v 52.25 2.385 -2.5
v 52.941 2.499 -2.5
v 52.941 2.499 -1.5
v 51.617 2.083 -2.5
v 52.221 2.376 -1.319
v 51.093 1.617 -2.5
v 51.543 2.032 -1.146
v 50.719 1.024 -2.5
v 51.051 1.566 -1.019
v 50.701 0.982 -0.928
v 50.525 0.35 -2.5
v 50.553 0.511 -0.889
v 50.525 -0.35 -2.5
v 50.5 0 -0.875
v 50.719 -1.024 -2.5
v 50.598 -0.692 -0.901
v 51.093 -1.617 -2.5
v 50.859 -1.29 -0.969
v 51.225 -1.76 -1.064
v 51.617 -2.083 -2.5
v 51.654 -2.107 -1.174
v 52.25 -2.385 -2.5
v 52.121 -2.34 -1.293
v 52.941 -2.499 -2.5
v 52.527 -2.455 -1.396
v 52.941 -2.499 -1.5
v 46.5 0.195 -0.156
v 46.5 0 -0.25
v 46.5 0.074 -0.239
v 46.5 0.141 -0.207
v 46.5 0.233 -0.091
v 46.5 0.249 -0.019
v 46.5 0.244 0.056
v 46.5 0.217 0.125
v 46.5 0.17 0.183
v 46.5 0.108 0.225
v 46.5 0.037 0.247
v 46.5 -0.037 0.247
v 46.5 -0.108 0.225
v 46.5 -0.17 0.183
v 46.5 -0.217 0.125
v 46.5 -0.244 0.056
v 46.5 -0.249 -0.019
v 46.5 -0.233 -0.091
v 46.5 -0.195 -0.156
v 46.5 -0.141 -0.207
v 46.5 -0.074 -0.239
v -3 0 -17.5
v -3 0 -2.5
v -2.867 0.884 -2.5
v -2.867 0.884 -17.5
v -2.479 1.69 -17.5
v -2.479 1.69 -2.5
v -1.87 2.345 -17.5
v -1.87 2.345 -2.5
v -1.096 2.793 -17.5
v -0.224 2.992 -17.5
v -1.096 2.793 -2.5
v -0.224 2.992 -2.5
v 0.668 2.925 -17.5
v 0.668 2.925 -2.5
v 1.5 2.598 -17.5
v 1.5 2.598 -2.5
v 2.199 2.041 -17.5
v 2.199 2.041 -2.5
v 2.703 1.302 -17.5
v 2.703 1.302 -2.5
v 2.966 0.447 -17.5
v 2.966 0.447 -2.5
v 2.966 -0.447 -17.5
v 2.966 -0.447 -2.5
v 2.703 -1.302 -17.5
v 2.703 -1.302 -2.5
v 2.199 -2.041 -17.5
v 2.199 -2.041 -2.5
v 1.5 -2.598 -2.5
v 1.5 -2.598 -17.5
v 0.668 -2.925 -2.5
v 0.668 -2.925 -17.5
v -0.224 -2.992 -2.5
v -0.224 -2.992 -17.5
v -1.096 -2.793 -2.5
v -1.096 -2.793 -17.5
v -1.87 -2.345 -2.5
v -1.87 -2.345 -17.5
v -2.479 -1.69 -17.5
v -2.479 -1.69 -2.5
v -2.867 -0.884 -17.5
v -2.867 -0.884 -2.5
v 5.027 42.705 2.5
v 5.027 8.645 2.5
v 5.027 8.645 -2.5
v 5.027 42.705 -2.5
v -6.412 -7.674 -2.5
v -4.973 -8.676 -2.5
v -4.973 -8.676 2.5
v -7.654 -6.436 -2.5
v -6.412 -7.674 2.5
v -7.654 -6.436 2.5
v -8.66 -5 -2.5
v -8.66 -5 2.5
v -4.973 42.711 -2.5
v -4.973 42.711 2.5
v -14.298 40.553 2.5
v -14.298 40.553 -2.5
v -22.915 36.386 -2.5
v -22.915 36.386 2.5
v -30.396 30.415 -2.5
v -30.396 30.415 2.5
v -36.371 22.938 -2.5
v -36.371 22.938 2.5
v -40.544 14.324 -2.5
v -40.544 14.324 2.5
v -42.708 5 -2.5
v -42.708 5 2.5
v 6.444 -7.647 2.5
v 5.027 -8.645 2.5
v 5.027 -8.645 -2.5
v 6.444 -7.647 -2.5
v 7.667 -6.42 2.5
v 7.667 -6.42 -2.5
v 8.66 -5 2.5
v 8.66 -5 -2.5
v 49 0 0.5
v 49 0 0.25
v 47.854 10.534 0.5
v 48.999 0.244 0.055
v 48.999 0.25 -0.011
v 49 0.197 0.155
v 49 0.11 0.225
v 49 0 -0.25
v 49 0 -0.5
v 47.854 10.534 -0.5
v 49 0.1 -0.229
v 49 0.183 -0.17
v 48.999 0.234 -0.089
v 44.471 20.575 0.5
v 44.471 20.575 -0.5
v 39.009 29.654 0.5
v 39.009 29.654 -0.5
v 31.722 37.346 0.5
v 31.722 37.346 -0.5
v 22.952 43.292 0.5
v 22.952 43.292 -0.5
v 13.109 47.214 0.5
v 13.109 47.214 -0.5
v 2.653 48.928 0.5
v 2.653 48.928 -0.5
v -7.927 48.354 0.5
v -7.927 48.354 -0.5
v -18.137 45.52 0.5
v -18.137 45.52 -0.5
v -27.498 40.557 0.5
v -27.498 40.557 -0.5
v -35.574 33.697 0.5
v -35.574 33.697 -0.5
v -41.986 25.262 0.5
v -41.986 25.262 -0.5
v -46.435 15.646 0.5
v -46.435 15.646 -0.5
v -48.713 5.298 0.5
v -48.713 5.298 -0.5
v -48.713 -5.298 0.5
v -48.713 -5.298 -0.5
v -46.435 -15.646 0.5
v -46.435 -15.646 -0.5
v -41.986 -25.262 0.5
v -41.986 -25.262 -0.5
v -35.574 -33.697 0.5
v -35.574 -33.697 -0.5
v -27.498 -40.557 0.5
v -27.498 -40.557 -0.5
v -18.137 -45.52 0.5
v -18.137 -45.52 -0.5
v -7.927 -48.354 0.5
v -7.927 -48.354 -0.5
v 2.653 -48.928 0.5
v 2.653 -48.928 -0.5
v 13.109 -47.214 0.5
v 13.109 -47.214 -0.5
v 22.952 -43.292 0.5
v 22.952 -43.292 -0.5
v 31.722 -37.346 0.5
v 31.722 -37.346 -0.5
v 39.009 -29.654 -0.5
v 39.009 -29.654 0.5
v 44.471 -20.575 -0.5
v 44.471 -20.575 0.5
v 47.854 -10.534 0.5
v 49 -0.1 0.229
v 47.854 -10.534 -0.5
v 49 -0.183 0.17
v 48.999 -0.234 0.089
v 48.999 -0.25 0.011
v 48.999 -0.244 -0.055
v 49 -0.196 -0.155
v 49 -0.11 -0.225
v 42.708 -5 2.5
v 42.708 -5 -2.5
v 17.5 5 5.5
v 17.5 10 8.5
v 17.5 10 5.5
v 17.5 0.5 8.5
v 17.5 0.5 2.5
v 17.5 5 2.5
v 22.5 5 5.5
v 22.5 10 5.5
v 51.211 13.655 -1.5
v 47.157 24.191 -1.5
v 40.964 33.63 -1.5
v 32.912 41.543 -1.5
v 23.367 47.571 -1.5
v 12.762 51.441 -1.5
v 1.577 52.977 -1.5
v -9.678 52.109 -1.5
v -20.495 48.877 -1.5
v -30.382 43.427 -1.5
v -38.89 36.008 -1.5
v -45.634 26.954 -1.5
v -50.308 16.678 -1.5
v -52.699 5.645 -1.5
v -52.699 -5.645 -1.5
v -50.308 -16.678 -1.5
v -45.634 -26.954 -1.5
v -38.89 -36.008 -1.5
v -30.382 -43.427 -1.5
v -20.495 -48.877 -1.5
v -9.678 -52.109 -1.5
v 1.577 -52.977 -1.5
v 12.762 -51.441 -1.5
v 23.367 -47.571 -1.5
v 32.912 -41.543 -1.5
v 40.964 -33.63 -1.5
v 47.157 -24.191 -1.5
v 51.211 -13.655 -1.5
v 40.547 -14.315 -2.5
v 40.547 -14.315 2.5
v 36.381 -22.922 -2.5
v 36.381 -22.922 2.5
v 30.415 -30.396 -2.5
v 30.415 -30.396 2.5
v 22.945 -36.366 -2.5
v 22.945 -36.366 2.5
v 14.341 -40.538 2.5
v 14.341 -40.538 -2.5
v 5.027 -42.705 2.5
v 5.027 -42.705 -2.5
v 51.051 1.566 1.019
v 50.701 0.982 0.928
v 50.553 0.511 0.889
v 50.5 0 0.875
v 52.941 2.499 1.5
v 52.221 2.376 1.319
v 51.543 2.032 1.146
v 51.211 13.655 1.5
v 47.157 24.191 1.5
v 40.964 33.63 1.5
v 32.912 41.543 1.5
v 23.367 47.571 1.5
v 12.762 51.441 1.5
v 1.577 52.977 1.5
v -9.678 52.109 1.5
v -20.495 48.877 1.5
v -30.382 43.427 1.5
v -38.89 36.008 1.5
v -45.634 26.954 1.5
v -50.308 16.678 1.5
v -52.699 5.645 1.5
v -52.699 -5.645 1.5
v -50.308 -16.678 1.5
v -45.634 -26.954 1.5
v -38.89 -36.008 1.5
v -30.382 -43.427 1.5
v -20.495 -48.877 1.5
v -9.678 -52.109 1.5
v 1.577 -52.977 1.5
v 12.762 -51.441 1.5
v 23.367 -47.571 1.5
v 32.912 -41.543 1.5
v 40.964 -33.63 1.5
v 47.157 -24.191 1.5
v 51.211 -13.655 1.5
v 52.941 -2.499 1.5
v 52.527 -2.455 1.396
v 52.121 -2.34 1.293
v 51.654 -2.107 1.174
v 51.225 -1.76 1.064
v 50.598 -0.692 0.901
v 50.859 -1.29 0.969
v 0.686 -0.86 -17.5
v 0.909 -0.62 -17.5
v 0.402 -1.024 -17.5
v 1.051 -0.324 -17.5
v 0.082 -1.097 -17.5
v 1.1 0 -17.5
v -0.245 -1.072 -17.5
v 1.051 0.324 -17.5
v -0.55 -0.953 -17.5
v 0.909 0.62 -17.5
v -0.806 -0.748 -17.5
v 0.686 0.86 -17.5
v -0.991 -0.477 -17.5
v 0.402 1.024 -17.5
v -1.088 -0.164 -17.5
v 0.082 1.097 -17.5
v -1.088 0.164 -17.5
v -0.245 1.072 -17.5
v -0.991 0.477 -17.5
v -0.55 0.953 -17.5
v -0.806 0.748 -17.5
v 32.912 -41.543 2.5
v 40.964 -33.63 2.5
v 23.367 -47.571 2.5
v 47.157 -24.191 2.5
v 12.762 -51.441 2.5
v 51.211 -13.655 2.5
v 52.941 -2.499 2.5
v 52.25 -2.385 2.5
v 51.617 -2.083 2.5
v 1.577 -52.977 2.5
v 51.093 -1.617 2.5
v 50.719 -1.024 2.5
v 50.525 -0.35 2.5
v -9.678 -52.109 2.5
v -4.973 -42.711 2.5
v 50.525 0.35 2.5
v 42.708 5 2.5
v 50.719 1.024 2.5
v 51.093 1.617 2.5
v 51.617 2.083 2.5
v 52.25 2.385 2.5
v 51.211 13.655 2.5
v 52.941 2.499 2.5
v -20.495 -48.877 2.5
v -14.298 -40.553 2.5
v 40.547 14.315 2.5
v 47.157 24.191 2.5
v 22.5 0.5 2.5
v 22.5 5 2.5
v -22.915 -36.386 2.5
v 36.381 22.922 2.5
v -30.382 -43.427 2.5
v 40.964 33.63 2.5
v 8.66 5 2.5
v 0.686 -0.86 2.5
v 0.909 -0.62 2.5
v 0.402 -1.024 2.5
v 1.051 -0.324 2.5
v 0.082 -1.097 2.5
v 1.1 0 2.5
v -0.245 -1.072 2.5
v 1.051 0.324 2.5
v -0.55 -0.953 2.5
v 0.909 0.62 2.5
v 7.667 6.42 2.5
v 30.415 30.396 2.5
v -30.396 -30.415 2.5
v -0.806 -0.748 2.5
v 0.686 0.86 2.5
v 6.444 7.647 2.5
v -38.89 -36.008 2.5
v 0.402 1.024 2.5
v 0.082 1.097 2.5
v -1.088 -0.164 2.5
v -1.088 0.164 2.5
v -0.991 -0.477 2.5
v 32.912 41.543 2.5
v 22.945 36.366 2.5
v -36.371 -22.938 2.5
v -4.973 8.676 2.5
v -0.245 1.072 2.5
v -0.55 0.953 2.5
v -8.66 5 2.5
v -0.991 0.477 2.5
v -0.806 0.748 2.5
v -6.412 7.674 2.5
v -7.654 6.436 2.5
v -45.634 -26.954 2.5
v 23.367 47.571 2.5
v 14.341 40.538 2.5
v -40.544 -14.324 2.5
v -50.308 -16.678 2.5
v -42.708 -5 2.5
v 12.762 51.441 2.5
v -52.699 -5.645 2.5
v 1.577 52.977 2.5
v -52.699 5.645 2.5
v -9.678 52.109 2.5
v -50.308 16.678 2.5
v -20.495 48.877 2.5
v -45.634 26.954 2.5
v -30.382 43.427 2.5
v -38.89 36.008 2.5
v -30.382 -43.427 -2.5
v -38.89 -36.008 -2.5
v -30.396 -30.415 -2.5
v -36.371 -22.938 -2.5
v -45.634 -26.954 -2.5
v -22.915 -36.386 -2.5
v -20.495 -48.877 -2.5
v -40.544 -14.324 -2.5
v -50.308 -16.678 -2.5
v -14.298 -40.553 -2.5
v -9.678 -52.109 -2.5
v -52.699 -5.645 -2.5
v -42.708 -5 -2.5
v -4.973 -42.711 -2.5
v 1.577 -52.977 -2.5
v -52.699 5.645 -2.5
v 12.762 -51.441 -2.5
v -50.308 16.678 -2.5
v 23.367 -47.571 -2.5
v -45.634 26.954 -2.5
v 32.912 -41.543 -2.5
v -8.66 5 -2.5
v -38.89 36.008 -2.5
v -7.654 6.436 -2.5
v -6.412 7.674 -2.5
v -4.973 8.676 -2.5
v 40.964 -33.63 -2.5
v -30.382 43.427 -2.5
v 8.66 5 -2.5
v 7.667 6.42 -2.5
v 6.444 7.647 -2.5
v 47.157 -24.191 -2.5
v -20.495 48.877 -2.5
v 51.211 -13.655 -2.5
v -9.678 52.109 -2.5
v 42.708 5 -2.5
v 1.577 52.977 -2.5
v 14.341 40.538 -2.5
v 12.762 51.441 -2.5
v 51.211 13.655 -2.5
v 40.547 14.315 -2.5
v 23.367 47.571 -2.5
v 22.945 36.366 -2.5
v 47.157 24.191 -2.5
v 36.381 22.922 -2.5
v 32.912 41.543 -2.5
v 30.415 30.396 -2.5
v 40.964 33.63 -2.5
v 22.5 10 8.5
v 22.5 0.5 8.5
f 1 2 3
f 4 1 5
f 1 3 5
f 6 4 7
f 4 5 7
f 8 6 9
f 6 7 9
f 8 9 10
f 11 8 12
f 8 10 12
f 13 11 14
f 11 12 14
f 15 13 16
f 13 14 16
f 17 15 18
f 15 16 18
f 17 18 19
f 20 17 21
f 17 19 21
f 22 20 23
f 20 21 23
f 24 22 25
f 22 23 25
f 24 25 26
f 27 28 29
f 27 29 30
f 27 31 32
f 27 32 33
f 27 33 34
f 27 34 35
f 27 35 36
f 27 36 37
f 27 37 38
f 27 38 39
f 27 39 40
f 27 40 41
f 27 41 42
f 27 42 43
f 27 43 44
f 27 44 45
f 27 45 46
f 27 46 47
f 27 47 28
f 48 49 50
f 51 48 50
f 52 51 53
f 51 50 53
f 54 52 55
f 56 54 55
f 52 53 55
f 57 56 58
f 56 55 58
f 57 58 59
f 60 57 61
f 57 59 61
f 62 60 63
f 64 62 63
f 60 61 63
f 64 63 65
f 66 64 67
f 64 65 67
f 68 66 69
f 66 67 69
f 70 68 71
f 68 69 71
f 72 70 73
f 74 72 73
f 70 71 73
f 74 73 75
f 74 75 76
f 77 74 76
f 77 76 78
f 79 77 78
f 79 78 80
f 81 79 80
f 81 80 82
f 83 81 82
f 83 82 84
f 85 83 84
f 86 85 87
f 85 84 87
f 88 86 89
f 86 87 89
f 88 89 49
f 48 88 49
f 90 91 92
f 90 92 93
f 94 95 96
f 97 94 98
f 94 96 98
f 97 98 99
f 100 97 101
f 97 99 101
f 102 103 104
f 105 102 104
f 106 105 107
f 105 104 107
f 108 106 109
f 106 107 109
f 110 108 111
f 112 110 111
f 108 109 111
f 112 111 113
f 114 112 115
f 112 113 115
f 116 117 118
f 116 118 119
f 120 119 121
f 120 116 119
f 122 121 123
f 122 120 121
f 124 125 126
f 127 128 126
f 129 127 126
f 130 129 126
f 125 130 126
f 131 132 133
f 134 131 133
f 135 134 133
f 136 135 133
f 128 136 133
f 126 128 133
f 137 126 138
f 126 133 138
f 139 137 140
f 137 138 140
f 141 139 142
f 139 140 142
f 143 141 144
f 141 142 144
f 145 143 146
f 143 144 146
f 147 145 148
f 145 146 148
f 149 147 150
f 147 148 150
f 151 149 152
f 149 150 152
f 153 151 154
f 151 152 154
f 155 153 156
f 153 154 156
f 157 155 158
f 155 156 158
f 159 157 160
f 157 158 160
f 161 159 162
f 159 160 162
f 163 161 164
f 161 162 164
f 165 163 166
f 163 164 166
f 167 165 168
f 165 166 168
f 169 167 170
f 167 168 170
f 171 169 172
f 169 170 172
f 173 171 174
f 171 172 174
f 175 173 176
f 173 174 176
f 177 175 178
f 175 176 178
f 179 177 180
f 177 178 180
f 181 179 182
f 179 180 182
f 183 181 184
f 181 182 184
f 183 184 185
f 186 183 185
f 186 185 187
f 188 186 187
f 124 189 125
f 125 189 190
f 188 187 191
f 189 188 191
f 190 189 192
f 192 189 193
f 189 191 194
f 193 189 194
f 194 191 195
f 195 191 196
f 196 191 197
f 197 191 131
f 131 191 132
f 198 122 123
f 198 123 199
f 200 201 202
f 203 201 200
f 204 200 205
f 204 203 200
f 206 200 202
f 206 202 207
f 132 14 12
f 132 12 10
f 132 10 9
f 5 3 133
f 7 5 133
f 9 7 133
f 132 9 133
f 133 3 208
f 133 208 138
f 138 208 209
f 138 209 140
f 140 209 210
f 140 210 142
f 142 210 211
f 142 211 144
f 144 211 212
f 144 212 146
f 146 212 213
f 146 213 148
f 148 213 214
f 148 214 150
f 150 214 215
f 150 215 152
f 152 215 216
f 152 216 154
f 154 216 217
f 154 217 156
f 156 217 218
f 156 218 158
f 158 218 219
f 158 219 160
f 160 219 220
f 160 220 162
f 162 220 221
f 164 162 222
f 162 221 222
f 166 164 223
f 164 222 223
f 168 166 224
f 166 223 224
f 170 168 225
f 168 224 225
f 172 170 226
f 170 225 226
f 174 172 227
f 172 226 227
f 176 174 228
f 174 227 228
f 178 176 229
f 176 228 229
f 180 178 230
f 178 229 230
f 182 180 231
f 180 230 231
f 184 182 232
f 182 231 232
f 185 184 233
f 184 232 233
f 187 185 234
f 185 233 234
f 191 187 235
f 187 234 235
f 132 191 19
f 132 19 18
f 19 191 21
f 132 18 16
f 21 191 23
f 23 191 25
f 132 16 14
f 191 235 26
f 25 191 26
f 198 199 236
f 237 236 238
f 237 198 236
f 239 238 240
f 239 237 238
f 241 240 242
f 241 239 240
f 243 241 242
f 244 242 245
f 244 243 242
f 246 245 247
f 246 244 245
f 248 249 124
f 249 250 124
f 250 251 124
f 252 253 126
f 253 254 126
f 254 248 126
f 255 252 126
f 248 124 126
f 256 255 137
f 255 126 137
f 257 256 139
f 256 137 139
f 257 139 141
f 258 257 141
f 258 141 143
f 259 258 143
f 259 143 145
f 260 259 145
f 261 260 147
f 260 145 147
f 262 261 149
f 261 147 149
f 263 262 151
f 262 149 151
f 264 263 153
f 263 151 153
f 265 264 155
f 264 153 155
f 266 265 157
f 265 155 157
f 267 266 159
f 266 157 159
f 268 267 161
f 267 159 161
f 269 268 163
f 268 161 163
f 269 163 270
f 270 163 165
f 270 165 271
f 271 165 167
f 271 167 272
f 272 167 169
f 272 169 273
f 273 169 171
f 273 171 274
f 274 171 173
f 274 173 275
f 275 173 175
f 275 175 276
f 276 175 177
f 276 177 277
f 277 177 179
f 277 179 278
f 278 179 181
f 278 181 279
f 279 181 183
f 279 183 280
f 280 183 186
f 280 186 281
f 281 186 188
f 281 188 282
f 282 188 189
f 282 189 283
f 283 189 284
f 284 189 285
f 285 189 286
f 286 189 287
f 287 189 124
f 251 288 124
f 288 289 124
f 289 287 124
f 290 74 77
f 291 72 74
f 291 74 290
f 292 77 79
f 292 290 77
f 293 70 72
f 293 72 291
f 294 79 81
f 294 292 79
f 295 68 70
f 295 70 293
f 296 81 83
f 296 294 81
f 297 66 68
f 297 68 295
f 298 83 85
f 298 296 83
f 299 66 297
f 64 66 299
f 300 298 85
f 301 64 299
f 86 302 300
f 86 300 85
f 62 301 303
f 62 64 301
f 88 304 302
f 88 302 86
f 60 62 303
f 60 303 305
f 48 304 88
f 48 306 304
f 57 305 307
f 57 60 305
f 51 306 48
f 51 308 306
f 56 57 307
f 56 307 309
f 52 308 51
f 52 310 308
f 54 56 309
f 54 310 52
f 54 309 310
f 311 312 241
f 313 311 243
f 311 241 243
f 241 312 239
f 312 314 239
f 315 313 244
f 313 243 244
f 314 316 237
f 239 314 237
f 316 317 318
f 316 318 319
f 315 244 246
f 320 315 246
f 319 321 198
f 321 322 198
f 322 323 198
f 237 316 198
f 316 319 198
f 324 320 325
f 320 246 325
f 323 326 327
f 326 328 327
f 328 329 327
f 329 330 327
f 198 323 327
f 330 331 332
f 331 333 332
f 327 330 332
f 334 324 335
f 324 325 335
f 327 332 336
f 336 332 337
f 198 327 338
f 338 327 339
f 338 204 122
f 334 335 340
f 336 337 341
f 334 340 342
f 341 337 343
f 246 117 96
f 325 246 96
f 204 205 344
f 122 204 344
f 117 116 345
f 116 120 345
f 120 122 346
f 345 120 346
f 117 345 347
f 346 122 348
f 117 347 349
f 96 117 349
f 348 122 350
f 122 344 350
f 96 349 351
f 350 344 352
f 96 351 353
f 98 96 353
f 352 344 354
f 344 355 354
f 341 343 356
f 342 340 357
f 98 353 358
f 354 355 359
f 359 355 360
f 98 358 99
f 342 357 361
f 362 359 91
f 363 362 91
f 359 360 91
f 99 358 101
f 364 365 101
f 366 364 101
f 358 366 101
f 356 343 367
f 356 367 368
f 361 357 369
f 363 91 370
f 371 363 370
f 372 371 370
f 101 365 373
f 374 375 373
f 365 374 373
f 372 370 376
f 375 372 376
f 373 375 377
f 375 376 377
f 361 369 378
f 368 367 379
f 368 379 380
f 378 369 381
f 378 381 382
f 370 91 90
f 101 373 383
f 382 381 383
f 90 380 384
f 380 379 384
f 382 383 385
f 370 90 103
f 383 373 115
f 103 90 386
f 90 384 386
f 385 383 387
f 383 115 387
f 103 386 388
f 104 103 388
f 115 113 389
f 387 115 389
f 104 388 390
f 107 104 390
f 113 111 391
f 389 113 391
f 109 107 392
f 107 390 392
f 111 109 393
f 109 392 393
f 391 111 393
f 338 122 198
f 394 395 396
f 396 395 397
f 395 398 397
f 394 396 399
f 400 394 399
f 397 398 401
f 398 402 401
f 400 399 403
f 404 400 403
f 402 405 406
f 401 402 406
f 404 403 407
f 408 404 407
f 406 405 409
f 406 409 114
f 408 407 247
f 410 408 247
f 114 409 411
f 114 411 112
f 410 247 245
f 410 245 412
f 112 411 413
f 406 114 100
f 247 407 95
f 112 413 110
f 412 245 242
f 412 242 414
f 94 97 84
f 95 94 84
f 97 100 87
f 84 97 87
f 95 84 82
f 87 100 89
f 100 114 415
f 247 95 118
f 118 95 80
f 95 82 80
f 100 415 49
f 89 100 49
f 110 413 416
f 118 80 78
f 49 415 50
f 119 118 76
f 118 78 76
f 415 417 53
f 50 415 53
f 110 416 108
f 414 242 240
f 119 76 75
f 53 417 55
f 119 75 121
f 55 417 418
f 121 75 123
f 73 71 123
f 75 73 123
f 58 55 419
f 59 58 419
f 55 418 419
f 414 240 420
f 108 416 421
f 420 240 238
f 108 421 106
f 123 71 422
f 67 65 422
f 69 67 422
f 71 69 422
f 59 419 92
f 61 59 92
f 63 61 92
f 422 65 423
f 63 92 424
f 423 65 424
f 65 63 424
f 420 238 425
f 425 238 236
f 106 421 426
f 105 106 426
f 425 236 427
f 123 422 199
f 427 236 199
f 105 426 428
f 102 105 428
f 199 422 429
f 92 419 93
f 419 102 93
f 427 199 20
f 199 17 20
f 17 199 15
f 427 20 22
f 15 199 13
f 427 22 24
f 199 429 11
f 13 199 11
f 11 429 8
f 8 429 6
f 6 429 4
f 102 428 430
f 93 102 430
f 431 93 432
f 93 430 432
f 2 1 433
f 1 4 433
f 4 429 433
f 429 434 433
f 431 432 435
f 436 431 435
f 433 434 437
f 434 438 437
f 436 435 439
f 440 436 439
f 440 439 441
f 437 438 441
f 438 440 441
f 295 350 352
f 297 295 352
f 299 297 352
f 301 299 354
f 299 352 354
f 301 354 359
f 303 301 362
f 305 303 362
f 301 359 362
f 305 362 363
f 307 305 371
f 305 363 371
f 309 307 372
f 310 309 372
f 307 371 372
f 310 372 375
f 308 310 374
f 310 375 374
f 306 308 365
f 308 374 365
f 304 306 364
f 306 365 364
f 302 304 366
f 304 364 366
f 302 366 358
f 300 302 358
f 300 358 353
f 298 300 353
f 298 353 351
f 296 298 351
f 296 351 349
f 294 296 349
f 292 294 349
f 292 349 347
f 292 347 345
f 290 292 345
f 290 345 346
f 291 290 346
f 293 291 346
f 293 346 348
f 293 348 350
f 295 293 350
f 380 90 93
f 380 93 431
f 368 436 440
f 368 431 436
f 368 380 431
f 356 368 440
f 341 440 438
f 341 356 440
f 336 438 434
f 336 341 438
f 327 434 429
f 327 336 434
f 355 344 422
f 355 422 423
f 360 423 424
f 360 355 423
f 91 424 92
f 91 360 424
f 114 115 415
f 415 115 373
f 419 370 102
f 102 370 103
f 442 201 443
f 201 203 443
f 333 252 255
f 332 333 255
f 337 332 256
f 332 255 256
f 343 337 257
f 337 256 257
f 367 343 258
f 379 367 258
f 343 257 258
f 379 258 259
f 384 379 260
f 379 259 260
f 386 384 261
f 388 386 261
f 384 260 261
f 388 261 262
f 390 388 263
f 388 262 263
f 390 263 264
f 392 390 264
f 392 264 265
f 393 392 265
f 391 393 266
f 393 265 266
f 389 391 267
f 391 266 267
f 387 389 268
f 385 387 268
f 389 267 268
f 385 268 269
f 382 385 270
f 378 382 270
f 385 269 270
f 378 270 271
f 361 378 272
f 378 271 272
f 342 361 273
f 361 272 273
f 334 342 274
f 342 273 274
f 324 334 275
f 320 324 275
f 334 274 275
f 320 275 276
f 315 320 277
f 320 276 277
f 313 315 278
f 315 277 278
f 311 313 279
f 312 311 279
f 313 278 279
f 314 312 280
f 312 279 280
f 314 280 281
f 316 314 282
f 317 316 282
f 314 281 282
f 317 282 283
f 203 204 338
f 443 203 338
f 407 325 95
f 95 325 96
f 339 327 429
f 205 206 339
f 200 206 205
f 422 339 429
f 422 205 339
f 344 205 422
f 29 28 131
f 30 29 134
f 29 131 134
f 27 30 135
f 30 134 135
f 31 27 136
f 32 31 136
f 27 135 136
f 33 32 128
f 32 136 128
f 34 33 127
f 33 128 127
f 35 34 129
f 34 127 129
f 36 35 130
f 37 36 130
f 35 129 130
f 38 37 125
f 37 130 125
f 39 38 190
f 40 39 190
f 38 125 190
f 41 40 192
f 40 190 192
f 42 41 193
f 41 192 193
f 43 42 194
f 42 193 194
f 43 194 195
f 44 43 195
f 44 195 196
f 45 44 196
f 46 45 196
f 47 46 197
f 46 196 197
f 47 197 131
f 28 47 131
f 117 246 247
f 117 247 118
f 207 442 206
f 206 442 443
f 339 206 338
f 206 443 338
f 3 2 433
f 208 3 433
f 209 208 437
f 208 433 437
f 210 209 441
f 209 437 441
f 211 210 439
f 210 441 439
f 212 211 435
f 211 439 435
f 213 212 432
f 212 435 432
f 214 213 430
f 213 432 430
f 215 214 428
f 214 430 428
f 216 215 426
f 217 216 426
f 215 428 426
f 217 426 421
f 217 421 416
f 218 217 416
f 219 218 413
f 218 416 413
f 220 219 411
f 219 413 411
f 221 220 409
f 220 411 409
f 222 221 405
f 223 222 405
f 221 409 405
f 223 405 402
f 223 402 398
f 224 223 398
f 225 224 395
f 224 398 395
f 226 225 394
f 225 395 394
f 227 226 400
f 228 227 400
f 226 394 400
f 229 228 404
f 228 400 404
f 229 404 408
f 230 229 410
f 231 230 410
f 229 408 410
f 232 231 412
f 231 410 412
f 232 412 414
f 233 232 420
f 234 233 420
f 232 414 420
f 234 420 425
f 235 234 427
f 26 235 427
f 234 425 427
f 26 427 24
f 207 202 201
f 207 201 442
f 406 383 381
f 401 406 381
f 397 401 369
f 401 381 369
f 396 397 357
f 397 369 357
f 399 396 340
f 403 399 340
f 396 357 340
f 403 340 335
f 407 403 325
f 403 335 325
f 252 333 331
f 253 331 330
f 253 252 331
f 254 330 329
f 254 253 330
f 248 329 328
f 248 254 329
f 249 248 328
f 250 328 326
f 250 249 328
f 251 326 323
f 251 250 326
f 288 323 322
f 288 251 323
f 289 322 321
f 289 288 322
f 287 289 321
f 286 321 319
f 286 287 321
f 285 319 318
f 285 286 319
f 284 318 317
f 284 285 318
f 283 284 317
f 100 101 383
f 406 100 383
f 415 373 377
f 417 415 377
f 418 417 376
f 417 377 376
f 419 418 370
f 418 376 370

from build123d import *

# Parameters (mm, degrees)
CUT_EXTRUDE2_REACH      = 7
SKETCH6_W               = 5
SKETCH6_H               = 4.5
BOSS_EXTRUDE1_DEPTH     = 6
SKETCH7_W               = 5
SKETCH7_H               = 3
BOSS_EXTRUDE2_DEPTH     = 5
SKETCH23_R              = 3
BOSS_EXTRUDE5_DEPTH     = 15
SKETCH5_R               = 1.1
CUT_EXTRUDE3_DEPTH      = 7
CUT_EXTRUDE3_DEPTH_BACK = 21
SKETCH22_R              = 2.5
CUT_EXTRUDE4_DEPTH      = 9.5
CUT_EXTRUDE4_DEPTH_BACK = 18.5
SKETCH21_R              = 0.25
CUT_EXTRUDE5_DEPTH      = 2.5


with BuildPart() as part:
    # Sketch2 → Revolve1 (revolve)
    with BuildSketch(Plane(origin=(0, 0, 0), x_dir=(1, 0, 0), z_dir=(0, 1, 0))):
        Polygon((53, -1.5), (49, -0.5), (49, 0.5), (53, 1.5), (53, 2.5), (50, 2.5), (0, 2.5), (0, -2.5), (50, -2.5), (53, -2.5), align=None)
    revolve(axis=Axis((0, 0, -2.5), (0, 0, 1)))

    # Sketch4 → Cut-Extrude2 (cut, up to next)
    with BuildSketch(Plane.XY.offset(2.5), mode=Mode.PRIVATE) as cut_extrude2_sk1:
        with BuildLine():
            Line((5.026990014, 8.644615168), (5.026990014, 42.705144554))
            ThreePointArc((5.026990014, 42.705144554), (30.415198012, 30.395982134), (42.708313008, 5))
            Line((42.708313008, 5), (8.660254038, 5))
            ThreePointArc((8.660254038, 5), (7.082087783, 7.06003064), (5.026990014, 8.644615168))
        make_face()
    cut_extrude2_tool1 = extrude(cut_extrude2_sk1.sketch, amount=-CUT_EXTRUDE2_REACH, mode=Mode.PRIVATE) & part.part
    add(cut_extrude2_tool1.solids().sort_by_distance((20.56337, 20.545095, 2.5))[0], mode=Mode.SUBTRACT)
    # Sketch4 → Cut-Extrude2 (cut, up to next)
    with BuildSketch(Plane.XY.offset(2.5), mode=Mode.PRIVATE) as cut_extrude2_sk2:
        with BuildLine():
            Line((-4.973009986, -42.711464172), (-4.973009986, -8.675780754))
            ThreePointArc((-4.973009986, -8.675780754), (-7.060050497, -7.082067988), (-8.660254038, -5))
            Line((-8.660254038, -5), (-42.708313008, -5))
            ThreePointArc((-42.708313008, -5), (-30.395982845, -30.415197302), (-4.973009986, -42.711464172))
        make_face()
    cut_extrude2_tool2 = extrude(cut_extrude2_sk2.sketch, amount=-CUT_EXTRUDE2_REACH, mode=Mode.PRIVATE) & part.part
    add(cut_extrude2_tool2.solids().sort_by_distance((-20.535898, -20.554166, 2.5))[0], mode=Mode.SUBTRACT)
    # Sketch4 → Cut-Extrude2 (cut, up to next)
    with BuildSketch(Plane.XY.offset(2.5), mode=Mode.PRIVATE) as cut_extrude2_sk3:
        with BuildLine():
            Line((5.026990014, -42.705144554), (5.026990014, -8.644615168))
            ThreePointArc((5.026990014, -8.644615168), (7.082087783, -7.06003064), (8.660254038, -5))
            Line((8.660254038, -5), (42.708313008, -5))
            ThreePointArc((42.708313008, -5), (30.415198012, -30.395982134), (5.026990014, -42.705144554))
        make_face()
    cut_extrude2_tool3 = extrude(cut_extrude2_sk3.sketch, amount=-CUT_EXTRUDE2_REACH, mode=Mode.PRIVATE) & part.part
    add(cut_extrude2_tool3.solids().sort_by_distance((20.56337, -20.545095, 2.5))[0], mode=Mode.SUBTRACT)
    # Sketch4 → Cut-Extrude2 (cut, up to next)
    with BuildSketch(Plane.XY.offset(2.5), mode=Mode.PRIVATE) as cut_extrude2_sk4:
        with BuildLine():
            Line((-42.708313008, 5), (-8.660254038, 5))
            ThreePointArc((-8.660254038, 5), (-7.060050497, 7.082067988), (-4.973009986, 8.675780754))
            Line((-4.973009986, 8.675780754), (-4.973009986, 42.711464172))
            ThreePointArc((-4.973009986, 42.711464172), (-30.395982845, 30.415197302), (-42.708313008, 5))
        make_face()
    cut_extrude2_tool4 = extrude(cut_extrude2_sk4.sketch, amount=-CUT_EXTRUDE2_REACH, mode=Mode.PRIVATE) & part.part
    add(cut_extrude2_tool4.solids().sort_by_distance((-20.535898, 20.554166, 2.5))[0], mode=Mode.SUBTRACT)

    # Sketch6 → Boss-Extrude1 (add)
    with BuildSketch(Plane.XY.offset(2.5)):
        with Locations((20, 2.75)):
            Rectangle(SKETCH6_W, SKETCH6_H)
    extrude(amount=BOSS_EXTRUDE1_DEPTH)

    # Sketch7 → Boss-Extrude2 (add)
    with BuildSketch(Plane(origin=(0, 5, 0), x_dir=(1, 0, 0), z_dir=(0, 1, 0))):
        with Locations((20, -7)):
            Rectangle(SKETCH7_W, SKETCH7_H)
    extrude(amount=BOSS_EXTRUDE2_DEPTH)

    # Sketch23 → Boss-Extrude5 (add)
    with BuildSketch(Plane(origin=(0, 0, -2.5), x_dir=(-1, 0, 0), z_dir=(0, 0, -1))):
        Circle(SKETCH23_R)
    extrude(amount=BOSS_EXTRUDE5_DEPTH)

    # Sketch5 → Cut-Extrude3 (cut, two sides)
    with BuildSketch(Plane.XY.offset(2.5)) as cut_extrude3_sk:
        Circle(SKETCH5_R)
    extrude(amount=CUT_EXTRUDE3_DEPTH, mode=Mode.SUBTRACT)
    extrude(cut_extrude3_sk.sketch, amount=-CUT_EXTRUDE3_DEPTH_BACK, mode=Mode.SUBTRACT)

    # Sketch22 → Cut-Extrude4 (cut, two sides)
    with BuildSketch(Plane.XY) as cut_extrude4_sk:
        with Locations((53, 0)):
            Circle(SKETCH22_R)
    extrude(amount=CUT_EXTRUDE4_DEPTH, mode=Mode.SUBTRACT)
    extrude(cut_extrude4_sk.sketch, amount=-CUT_EXTRUDE4_DEPTH_BACK, mode=Mode.SUBTRACT)

    # Sketch21 → Cut-Extrude5 (cut)
    with BuildSketch(Plane(origin=(49, 0, 0), x_dir=(0, 0, -1), z_dir=(1, 0, 0))):
        Circle(SKETCH21_R)
    extrude(amount=-CUT_EXTRUDE5_DEPTH, mode=Mode.SUBTRACT)


solid = part.part
